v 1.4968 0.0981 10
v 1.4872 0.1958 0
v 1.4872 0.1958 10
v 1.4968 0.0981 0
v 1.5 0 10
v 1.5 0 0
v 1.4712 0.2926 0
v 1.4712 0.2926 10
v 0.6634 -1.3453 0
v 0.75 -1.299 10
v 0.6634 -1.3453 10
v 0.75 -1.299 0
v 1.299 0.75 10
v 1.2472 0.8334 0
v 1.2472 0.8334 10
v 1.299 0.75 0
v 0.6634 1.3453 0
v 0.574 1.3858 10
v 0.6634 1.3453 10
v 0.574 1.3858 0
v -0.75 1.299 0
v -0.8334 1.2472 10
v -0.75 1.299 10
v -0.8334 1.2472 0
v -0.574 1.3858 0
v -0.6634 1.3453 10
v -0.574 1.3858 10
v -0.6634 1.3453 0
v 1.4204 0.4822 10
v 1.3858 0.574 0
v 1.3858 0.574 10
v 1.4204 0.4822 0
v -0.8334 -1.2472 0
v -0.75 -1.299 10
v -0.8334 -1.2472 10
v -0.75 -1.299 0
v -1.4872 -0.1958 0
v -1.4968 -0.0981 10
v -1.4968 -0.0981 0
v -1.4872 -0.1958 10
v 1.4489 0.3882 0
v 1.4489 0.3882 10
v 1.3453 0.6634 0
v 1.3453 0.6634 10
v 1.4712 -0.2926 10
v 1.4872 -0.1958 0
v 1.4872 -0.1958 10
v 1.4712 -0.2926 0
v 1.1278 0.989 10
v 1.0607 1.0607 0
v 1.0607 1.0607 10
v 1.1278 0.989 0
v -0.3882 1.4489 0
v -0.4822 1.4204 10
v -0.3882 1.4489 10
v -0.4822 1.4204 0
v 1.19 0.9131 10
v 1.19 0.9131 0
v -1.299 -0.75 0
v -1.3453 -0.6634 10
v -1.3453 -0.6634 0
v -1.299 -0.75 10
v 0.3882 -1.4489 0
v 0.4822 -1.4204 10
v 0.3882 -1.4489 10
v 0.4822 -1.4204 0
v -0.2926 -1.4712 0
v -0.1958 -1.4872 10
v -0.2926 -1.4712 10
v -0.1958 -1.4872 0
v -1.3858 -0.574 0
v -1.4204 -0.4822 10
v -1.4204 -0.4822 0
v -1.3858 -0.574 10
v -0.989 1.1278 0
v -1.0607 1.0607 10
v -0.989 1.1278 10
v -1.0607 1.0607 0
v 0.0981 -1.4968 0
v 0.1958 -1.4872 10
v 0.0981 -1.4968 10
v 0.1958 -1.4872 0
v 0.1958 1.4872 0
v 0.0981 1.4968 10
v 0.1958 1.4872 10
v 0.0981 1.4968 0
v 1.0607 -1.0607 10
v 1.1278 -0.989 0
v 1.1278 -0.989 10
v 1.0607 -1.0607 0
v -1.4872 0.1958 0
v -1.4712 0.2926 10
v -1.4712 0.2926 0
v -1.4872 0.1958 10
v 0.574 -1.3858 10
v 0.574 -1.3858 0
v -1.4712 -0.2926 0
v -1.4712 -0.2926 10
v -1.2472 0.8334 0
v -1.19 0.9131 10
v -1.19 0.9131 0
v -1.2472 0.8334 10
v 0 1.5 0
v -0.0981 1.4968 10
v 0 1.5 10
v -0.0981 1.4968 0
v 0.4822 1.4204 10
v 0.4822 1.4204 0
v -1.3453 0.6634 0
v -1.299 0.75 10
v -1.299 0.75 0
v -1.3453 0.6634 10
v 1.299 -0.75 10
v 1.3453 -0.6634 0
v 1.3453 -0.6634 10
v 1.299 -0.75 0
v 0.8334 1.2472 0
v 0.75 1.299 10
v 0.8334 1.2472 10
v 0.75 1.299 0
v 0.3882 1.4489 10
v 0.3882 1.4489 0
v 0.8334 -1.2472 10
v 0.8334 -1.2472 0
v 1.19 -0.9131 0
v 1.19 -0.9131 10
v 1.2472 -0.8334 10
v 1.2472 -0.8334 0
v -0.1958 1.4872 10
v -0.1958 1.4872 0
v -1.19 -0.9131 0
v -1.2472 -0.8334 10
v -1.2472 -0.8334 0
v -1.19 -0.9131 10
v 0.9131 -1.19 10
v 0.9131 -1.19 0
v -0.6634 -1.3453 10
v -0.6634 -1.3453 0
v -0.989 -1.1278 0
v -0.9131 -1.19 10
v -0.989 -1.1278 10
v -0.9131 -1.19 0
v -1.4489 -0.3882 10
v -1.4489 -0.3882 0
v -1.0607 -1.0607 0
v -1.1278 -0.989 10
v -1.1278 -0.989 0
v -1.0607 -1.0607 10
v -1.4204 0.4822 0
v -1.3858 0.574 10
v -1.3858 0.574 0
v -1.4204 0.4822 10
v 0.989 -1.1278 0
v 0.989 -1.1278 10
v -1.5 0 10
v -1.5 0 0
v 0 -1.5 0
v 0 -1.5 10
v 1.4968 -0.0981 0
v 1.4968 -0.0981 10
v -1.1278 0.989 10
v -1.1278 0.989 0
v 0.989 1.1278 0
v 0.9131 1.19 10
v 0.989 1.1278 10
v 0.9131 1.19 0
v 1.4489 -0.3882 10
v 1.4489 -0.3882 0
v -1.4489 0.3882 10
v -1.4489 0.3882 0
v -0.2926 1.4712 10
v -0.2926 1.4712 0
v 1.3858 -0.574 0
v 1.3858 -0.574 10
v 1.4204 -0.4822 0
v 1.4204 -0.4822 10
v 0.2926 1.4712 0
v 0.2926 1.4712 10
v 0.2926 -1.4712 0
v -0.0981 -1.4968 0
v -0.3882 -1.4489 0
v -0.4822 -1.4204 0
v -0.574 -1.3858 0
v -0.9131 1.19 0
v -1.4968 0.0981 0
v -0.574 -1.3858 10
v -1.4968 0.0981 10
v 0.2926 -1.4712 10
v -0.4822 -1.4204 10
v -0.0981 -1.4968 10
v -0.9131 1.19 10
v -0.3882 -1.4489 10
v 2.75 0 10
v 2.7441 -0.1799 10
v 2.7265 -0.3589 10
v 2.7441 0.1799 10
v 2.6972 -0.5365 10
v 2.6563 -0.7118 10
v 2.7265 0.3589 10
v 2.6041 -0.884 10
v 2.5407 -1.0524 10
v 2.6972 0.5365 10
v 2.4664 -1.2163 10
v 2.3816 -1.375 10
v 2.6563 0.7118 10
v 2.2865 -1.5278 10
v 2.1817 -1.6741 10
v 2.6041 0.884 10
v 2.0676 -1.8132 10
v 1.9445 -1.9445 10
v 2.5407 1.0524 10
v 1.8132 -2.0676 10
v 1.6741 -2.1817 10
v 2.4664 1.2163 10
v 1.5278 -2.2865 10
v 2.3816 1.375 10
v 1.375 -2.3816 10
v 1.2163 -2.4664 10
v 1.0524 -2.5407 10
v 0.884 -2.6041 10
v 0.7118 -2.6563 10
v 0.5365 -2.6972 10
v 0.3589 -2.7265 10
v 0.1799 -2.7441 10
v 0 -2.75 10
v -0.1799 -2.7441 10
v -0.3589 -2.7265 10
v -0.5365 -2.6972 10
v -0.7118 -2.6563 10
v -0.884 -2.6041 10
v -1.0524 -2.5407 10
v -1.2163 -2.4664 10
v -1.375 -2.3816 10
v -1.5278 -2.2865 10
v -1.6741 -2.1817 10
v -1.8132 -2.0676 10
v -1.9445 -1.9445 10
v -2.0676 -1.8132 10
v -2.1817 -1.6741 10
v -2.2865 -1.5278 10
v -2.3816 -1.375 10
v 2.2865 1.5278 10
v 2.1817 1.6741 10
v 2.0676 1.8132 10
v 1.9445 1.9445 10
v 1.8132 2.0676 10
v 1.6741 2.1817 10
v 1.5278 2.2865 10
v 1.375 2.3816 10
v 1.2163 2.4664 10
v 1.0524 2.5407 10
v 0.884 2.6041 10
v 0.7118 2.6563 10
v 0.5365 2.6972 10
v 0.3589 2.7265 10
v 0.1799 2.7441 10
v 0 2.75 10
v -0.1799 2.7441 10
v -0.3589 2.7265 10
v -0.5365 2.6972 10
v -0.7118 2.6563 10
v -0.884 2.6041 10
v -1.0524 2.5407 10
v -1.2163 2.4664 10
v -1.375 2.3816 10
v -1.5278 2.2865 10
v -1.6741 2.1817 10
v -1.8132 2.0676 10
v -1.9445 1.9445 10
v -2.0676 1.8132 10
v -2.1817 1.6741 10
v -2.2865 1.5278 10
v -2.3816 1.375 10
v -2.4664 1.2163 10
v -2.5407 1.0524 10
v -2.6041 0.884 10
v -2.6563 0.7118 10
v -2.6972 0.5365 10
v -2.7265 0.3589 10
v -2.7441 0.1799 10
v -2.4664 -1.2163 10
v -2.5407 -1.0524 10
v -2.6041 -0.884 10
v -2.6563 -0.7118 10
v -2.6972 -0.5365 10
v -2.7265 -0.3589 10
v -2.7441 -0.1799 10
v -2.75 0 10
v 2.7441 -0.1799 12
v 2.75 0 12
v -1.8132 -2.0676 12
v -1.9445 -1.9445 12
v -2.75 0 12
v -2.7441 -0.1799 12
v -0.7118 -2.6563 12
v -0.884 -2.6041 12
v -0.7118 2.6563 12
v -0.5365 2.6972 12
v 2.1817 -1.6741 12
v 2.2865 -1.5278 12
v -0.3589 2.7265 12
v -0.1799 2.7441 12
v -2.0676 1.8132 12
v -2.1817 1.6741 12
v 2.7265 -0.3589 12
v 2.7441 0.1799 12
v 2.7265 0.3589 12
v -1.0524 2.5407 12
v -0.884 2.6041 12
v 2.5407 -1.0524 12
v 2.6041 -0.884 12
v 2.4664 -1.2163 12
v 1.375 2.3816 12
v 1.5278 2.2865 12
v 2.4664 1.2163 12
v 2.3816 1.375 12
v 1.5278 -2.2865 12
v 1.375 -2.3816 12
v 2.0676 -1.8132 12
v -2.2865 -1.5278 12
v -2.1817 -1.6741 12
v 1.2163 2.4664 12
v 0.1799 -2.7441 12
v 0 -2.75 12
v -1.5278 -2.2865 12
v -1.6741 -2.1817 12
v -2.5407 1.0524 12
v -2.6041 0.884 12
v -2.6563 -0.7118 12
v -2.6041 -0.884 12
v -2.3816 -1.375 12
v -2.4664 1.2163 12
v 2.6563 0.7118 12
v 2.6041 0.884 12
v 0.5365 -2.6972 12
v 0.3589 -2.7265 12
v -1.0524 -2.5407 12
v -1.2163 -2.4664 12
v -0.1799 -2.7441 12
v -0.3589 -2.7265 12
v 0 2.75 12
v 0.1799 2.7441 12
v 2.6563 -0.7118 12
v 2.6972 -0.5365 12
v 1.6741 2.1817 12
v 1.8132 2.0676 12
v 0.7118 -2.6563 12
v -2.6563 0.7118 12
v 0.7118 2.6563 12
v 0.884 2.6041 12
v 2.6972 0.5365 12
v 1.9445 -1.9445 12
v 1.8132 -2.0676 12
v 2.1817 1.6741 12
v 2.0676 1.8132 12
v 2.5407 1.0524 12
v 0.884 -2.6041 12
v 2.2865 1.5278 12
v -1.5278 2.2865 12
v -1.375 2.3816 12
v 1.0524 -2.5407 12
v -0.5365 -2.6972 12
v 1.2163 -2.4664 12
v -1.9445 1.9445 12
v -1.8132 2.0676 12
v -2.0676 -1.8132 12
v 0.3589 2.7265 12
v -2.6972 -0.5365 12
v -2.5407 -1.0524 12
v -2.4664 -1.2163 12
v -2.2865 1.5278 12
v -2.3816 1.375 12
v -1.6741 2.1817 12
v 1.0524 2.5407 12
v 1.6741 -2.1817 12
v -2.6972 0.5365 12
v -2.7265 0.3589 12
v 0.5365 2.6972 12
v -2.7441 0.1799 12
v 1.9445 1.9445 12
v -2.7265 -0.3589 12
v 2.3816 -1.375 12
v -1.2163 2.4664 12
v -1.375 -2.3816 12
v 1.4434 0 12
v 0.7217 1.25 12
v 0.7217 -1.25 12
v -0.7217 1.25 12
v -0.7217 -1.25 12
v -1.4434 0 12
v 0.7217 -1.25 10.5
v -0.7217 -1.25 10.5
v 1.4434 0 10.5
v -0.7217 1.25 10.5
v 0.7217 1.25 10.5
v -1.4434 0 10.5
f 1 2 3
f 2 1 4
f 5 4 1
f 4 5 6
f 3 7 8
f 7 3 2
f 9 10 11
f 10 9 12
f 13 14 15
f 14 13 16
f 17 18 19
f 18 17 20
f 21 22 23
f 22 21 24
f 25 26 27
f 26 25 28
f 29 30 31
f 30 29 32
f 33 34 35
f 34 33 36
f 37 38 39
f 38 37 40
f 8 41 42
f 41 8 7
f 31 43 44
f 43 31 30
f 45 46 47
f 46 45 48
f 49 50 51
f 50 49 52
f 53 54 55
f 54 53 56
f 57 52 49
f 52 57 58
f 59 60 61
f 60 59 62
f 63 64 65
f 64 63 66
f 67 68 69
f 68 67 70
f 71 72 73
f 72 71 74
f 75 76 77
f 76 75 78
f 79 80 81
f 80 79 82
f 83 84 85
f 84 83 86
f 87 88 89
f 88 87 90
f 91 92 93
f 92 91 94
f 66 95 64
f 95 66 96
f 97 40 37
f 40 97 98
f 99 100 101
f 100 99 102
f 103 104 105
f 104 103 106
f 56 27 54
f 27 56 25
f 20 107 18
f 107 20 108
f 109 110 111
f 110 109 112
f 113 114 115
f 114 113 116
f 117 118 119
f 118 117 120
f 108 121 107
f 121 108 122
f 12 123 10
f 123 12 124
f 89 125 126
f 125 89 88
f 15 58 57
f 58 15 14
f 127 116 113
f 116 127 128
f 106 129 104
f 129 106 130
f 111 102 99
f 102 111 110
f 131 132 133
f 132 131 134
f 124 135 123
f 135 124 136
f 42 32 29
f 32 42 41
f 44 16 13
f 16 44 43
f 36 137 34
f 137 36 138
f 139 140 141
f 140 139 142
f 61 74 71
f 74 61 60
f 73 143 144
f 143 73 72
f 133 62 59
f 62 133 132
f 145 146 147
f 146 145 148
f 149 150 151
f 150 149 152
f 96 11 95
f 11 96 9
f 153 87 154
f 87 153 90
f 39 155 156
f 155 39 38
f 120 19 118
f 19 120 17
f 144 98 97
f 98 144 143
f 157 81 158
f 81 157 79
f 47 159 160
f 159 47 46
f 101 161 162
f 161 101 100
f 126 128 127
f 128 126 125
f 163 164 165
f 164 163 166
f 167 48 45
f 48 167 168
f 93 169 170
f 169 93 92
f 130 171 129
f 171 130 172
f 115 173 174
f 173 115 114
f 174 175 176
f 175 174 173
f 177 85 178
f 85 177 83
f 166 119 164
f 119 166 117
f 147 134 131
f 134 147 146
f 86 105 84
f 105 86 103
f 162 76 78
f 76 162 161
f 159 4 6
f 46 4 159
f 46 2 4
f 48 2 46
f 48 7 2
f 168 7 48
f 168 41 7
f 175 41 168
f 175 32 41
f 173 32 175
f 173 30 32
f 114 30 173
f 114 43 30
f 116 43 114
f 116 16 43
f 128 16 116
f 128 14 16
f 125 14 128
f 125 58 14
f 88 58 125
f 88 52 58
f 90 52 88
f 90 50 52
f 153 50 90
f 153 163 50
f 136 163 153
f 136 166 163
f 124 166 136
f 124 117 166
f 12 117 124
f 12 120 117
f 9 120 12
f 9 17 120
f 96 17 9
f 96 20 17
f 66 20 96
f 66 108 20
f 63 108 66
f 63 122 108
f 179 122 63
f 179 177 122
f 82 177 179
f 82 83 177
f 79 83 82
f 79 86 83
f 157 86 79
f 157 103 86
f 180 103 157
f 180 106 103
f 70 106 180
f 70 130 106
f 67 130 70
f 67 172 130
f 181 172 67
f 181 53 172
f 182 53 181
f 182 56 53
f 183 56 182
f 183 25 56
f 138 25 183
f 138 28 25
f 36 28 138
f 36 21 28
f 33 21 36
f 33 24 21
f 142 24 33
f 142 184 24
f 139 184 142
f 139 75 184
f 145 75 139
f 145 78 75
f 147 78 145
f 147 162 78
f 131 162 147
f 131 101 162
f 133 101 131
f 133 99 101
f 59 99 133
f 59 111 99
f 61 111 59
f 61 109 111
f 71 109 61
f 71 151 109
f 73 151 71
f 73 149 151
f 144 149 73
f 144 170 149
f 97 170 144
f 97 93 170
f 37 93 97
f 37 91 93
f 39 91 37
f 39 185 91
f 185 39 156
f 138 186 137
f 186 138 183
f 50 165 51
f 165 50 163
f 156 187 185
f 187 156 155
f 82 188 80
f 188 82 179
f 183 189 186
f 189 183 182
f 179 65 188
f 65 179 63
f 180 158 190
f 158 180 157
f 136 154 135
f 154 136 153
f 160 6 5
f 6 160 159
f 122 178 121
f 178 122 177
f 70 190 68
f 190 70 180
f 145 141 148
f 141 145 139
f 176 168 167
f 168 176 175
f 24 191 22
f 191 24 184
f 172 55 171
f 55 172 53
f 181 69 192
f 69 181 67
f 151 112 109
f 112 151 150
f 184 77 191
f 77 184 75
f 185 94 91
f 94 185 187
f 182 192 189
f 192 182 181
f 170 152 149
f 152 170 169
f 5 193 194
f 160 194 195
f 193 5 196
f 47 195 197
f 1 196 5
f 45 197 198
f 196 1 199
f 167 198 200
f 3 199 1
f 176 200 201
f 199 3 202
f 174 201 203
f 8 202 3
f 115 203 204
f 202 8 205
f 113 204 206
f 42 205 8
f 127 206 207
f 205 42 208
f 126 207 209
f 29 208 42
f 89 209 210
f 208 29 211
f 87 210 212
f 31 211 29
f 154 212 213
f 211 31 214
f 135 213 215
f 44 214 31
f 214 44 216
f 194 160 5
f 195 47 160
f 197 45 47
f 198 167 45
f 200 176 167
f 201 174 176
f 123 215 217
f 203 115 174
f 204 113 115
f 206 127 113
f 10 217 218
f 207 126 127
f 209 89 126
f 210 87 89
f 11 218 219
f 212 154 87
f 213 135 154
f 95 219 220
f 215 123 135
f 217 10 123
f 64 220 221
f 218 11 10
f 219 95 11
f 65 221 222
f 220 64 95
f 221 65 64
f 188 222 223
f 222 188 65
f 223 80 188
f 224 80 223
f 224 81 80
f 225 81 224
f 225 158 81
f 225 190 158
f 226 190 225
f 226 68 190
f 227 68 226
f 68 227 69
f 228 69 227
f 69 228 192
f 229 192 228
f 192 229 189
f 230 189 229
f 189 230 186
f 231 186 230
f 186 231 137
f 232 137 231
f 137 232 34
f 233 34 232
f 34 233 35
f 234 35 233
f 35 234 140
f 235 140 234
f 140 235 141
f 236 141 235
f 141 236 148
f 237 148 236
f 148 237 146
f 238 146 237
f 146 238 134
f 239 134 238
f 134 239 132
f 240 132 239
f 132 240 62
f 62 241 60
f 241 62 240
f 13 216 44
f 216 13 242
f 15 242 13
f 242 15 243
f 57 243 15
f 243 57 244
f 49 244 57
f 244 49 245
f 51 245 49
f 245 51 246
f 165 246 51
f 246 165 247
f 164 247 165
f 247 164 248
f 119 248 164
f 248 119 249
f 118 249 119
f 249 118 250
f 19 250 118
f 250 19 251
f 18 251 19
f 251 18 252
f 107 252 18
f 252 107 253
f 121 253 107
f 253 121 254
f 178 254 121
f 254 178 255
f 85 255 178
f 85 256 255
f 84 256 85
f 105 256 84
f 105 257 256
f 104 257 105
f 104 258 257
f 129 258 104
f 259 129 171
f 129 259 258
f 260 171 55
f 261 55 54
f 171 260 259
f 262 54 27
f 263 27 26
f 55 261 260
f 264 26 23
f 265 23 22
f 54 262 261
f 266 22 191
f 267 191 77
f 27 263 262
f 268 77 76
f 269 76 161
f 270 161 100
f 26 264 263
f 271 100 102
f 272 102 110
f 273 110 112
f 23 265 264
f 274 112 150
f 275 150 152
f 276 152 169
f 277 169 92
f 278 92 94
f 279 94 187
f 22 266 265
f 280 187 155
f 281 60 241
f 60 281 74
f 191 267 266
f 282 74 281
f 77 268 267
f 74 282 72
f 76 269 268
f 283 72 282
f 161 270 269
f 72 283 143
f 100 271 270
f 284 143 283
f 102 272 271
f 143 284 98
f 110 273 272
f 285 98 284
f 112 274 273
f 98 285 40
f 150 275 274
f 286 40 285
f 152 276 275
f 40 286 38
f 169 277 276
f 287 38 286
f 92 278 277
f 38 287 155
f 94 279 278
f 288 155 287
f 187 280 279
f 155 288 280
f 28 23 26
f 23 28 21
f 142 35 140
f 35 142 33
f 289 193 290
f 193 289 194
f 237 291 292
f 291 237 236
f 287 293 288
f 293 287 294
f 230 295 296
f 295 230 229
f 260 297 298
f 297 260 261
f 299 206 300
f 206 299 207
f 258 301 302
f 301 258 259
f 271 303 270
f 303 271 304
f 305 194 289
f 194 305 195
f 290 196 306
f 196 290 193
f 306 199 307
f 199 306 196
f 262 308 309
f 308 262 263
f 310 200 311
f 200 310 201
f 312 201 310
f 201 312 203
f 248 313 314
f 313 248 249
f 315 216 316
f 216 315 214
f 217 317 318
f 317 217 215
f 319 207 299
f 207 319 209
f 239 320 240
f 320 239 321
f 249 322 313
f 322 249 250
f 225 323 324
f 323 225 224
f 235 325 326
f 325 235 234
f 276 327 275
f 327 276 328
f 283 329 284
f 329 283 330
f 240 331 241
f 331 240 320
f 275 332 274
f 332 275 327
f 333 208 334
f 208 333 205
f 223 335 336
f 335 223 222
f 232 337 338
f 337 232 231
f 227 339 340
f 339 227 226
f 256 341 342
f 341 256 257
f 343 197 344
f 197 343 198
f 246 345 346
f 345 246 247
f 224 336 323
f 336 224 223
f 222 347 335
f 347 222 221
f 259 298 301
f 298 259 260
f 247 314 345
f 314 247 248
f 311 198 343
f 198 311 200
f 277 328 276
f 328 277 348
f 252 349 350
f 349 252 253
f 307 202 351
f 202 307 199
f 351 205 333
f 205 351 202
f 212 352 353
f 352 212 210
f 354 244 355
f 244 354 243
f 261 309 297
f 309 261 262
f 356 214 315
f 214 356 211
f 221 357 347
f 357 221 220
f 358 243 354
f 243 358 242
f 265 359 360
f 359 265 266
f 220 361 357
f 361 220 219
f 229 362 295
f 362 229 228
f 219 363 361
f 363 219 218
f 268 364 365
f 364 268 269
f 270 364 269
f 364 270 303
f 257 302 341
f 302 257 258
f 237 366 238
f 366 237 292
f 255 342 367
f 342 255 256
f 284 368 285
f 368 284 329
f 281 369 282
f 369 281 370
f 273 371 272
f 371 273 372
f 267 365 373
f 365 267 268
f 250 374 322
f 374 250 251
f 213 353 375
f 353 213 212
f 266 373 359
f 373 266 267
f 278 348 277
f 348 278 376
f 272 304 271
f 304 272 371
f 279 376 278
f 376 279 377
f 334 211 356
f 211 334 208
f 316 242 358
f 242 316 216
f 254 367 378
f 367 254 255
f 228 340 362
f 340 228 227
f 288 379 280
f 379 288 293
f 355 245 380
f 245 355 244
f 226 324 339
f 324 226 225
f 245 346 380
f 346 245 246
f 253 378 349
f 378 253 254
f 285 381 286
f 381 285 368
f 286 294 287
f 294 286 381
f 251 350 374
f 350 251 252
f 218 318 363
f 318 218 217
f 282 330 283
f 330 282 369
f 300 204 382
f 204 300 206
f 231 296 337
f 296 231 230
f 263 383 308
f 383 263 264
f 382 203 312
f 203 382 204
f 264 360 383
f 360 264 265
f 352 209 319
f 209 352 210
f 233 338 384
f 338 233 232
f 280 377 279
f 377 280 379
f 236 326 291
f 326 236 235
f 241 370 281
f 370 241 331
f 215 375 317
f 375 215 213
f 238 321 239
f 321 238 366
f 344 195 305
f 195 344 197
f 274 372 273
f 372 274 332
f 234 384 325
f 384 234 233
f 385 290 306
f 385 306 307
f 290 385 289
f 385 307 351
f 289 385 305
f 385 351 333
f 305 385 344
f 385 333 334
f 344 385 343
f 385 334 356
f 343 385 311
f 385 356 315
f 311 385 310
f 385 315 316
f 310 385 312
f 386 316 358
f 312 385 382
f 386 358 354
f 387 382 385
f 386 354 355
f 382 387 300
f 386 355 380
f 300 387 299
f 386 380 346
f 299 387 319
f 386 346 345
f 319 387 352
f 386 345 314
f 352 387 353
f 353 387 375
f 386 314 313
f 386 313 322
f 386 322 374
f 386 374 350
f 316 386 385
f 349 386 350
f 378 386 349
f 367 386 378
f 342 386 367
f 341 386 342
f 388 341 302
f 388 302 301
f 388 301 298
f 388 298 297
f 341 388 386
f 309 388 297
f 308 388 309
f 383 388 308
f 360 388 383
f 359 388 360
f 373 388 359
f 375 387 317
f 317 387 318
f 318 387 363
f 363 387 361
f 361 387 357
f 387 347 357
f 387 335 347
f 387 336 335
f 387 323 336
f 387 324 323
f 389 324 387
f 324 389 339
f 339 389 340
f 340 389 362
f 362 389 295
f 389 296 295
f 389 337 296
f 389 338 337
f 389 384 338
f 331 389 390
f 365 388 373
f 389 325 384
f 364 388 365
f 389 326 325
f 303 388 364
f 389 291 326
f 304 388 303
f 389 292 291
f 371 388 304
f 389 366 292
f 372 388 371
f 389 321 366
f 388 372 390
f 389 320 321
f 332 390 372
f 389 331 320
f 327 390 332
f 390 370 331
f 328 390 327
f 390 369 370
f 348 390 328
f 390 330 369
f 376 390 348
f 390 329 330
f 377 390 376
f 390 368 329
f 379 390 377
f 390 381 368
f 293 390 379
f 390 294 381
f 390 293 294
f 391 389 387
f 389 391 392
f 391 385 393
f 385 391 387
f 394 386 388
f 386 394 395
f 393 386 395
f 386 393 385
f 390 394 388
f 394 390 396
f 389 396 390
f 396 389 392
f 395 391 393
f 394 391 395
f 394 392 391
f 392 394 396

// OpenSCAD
$fn = 96;

d_shaft = 3.0;
L = 10.0;

d_head = 5.5;
h_head = 2.0;

hex_flat = 2.5;          // approximate for M3 socket
hex_depth = 1.5;         // approximate recess depth
hex_corner = hex_flat / cos(30);

module socket_head_cap_screw() {
    difference() {
        union() {
            // Shaft
            cylinder(d = d_shaft, h = L);

            // Head
            translate([0,0,L])
                cylinder(d = d_head, h = h_head);
        }

        // Hex socket recess
        translate([0,0,L + h_head - hex_depth])
            cylinder(r = hex_corner/2, h = hex_depth + 0.02, $fn = 6);
    }
}

socket_head_cap_screw();
